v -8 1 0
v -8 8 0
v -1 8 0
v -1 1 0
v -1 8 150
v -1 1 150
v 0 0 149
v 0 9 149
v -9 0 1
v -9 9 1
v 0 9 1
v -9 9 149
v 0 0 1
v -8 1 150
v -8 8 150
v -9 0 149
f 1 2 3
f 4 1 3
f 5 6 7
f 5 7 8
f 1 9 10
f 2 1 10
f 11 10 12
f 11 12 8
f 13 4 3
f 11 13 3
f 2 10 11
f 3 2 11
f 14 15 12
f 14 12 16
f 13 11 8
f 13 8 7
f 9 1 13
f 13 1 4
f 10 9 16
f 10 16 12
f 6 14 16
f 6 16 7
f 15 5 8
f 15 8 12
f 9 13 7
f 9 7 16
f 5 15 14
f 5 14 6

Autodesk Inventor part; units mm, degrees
ref_plane "YZ Plane" through (0, 0, 0) normal (1, 0, 0) x (0, 1, 0)
ref_plane "XZ Plane" through (0, 0, 0) normal (0, 1, 0) x (-1, 0, 0)
ref_plane "XY Plane" through (0, 0, 0) normal (0, 0, 1) x (1, 0, 0)
sketch "Sketch1" plane through (0, 0, 0) normal (0, 0, 1) x (1, 0, 0)
  line L0 (0, 0) -> (-9, 0)
  line L1 (-9, 0) -> (-9, 9)
  line L2 (-9, 9) -> (0, 9)
  line L3 (0, 9) -> (0, 0)
  dimension "d0" = 9
  dimension "d1" = 9
extrude "Extrusion1" add sketch "Sketch1" along normal blind 150
chamfer "Chamfer1" distance 1 angle 45 4 edges at (-4.5, 9, 150) (0, 4.5, 150) (-4.5, 0, 150) (-9, 4.5, 150)
chamfer "Chamfer2" distance 1 angle 45 4 edges at (-4.5, 9, 0) (0, 4.5, 0) (-4.5, 0, 0) (-9, 4.5, 0)
properties part number "Elbow_Both_Rod_V1"
